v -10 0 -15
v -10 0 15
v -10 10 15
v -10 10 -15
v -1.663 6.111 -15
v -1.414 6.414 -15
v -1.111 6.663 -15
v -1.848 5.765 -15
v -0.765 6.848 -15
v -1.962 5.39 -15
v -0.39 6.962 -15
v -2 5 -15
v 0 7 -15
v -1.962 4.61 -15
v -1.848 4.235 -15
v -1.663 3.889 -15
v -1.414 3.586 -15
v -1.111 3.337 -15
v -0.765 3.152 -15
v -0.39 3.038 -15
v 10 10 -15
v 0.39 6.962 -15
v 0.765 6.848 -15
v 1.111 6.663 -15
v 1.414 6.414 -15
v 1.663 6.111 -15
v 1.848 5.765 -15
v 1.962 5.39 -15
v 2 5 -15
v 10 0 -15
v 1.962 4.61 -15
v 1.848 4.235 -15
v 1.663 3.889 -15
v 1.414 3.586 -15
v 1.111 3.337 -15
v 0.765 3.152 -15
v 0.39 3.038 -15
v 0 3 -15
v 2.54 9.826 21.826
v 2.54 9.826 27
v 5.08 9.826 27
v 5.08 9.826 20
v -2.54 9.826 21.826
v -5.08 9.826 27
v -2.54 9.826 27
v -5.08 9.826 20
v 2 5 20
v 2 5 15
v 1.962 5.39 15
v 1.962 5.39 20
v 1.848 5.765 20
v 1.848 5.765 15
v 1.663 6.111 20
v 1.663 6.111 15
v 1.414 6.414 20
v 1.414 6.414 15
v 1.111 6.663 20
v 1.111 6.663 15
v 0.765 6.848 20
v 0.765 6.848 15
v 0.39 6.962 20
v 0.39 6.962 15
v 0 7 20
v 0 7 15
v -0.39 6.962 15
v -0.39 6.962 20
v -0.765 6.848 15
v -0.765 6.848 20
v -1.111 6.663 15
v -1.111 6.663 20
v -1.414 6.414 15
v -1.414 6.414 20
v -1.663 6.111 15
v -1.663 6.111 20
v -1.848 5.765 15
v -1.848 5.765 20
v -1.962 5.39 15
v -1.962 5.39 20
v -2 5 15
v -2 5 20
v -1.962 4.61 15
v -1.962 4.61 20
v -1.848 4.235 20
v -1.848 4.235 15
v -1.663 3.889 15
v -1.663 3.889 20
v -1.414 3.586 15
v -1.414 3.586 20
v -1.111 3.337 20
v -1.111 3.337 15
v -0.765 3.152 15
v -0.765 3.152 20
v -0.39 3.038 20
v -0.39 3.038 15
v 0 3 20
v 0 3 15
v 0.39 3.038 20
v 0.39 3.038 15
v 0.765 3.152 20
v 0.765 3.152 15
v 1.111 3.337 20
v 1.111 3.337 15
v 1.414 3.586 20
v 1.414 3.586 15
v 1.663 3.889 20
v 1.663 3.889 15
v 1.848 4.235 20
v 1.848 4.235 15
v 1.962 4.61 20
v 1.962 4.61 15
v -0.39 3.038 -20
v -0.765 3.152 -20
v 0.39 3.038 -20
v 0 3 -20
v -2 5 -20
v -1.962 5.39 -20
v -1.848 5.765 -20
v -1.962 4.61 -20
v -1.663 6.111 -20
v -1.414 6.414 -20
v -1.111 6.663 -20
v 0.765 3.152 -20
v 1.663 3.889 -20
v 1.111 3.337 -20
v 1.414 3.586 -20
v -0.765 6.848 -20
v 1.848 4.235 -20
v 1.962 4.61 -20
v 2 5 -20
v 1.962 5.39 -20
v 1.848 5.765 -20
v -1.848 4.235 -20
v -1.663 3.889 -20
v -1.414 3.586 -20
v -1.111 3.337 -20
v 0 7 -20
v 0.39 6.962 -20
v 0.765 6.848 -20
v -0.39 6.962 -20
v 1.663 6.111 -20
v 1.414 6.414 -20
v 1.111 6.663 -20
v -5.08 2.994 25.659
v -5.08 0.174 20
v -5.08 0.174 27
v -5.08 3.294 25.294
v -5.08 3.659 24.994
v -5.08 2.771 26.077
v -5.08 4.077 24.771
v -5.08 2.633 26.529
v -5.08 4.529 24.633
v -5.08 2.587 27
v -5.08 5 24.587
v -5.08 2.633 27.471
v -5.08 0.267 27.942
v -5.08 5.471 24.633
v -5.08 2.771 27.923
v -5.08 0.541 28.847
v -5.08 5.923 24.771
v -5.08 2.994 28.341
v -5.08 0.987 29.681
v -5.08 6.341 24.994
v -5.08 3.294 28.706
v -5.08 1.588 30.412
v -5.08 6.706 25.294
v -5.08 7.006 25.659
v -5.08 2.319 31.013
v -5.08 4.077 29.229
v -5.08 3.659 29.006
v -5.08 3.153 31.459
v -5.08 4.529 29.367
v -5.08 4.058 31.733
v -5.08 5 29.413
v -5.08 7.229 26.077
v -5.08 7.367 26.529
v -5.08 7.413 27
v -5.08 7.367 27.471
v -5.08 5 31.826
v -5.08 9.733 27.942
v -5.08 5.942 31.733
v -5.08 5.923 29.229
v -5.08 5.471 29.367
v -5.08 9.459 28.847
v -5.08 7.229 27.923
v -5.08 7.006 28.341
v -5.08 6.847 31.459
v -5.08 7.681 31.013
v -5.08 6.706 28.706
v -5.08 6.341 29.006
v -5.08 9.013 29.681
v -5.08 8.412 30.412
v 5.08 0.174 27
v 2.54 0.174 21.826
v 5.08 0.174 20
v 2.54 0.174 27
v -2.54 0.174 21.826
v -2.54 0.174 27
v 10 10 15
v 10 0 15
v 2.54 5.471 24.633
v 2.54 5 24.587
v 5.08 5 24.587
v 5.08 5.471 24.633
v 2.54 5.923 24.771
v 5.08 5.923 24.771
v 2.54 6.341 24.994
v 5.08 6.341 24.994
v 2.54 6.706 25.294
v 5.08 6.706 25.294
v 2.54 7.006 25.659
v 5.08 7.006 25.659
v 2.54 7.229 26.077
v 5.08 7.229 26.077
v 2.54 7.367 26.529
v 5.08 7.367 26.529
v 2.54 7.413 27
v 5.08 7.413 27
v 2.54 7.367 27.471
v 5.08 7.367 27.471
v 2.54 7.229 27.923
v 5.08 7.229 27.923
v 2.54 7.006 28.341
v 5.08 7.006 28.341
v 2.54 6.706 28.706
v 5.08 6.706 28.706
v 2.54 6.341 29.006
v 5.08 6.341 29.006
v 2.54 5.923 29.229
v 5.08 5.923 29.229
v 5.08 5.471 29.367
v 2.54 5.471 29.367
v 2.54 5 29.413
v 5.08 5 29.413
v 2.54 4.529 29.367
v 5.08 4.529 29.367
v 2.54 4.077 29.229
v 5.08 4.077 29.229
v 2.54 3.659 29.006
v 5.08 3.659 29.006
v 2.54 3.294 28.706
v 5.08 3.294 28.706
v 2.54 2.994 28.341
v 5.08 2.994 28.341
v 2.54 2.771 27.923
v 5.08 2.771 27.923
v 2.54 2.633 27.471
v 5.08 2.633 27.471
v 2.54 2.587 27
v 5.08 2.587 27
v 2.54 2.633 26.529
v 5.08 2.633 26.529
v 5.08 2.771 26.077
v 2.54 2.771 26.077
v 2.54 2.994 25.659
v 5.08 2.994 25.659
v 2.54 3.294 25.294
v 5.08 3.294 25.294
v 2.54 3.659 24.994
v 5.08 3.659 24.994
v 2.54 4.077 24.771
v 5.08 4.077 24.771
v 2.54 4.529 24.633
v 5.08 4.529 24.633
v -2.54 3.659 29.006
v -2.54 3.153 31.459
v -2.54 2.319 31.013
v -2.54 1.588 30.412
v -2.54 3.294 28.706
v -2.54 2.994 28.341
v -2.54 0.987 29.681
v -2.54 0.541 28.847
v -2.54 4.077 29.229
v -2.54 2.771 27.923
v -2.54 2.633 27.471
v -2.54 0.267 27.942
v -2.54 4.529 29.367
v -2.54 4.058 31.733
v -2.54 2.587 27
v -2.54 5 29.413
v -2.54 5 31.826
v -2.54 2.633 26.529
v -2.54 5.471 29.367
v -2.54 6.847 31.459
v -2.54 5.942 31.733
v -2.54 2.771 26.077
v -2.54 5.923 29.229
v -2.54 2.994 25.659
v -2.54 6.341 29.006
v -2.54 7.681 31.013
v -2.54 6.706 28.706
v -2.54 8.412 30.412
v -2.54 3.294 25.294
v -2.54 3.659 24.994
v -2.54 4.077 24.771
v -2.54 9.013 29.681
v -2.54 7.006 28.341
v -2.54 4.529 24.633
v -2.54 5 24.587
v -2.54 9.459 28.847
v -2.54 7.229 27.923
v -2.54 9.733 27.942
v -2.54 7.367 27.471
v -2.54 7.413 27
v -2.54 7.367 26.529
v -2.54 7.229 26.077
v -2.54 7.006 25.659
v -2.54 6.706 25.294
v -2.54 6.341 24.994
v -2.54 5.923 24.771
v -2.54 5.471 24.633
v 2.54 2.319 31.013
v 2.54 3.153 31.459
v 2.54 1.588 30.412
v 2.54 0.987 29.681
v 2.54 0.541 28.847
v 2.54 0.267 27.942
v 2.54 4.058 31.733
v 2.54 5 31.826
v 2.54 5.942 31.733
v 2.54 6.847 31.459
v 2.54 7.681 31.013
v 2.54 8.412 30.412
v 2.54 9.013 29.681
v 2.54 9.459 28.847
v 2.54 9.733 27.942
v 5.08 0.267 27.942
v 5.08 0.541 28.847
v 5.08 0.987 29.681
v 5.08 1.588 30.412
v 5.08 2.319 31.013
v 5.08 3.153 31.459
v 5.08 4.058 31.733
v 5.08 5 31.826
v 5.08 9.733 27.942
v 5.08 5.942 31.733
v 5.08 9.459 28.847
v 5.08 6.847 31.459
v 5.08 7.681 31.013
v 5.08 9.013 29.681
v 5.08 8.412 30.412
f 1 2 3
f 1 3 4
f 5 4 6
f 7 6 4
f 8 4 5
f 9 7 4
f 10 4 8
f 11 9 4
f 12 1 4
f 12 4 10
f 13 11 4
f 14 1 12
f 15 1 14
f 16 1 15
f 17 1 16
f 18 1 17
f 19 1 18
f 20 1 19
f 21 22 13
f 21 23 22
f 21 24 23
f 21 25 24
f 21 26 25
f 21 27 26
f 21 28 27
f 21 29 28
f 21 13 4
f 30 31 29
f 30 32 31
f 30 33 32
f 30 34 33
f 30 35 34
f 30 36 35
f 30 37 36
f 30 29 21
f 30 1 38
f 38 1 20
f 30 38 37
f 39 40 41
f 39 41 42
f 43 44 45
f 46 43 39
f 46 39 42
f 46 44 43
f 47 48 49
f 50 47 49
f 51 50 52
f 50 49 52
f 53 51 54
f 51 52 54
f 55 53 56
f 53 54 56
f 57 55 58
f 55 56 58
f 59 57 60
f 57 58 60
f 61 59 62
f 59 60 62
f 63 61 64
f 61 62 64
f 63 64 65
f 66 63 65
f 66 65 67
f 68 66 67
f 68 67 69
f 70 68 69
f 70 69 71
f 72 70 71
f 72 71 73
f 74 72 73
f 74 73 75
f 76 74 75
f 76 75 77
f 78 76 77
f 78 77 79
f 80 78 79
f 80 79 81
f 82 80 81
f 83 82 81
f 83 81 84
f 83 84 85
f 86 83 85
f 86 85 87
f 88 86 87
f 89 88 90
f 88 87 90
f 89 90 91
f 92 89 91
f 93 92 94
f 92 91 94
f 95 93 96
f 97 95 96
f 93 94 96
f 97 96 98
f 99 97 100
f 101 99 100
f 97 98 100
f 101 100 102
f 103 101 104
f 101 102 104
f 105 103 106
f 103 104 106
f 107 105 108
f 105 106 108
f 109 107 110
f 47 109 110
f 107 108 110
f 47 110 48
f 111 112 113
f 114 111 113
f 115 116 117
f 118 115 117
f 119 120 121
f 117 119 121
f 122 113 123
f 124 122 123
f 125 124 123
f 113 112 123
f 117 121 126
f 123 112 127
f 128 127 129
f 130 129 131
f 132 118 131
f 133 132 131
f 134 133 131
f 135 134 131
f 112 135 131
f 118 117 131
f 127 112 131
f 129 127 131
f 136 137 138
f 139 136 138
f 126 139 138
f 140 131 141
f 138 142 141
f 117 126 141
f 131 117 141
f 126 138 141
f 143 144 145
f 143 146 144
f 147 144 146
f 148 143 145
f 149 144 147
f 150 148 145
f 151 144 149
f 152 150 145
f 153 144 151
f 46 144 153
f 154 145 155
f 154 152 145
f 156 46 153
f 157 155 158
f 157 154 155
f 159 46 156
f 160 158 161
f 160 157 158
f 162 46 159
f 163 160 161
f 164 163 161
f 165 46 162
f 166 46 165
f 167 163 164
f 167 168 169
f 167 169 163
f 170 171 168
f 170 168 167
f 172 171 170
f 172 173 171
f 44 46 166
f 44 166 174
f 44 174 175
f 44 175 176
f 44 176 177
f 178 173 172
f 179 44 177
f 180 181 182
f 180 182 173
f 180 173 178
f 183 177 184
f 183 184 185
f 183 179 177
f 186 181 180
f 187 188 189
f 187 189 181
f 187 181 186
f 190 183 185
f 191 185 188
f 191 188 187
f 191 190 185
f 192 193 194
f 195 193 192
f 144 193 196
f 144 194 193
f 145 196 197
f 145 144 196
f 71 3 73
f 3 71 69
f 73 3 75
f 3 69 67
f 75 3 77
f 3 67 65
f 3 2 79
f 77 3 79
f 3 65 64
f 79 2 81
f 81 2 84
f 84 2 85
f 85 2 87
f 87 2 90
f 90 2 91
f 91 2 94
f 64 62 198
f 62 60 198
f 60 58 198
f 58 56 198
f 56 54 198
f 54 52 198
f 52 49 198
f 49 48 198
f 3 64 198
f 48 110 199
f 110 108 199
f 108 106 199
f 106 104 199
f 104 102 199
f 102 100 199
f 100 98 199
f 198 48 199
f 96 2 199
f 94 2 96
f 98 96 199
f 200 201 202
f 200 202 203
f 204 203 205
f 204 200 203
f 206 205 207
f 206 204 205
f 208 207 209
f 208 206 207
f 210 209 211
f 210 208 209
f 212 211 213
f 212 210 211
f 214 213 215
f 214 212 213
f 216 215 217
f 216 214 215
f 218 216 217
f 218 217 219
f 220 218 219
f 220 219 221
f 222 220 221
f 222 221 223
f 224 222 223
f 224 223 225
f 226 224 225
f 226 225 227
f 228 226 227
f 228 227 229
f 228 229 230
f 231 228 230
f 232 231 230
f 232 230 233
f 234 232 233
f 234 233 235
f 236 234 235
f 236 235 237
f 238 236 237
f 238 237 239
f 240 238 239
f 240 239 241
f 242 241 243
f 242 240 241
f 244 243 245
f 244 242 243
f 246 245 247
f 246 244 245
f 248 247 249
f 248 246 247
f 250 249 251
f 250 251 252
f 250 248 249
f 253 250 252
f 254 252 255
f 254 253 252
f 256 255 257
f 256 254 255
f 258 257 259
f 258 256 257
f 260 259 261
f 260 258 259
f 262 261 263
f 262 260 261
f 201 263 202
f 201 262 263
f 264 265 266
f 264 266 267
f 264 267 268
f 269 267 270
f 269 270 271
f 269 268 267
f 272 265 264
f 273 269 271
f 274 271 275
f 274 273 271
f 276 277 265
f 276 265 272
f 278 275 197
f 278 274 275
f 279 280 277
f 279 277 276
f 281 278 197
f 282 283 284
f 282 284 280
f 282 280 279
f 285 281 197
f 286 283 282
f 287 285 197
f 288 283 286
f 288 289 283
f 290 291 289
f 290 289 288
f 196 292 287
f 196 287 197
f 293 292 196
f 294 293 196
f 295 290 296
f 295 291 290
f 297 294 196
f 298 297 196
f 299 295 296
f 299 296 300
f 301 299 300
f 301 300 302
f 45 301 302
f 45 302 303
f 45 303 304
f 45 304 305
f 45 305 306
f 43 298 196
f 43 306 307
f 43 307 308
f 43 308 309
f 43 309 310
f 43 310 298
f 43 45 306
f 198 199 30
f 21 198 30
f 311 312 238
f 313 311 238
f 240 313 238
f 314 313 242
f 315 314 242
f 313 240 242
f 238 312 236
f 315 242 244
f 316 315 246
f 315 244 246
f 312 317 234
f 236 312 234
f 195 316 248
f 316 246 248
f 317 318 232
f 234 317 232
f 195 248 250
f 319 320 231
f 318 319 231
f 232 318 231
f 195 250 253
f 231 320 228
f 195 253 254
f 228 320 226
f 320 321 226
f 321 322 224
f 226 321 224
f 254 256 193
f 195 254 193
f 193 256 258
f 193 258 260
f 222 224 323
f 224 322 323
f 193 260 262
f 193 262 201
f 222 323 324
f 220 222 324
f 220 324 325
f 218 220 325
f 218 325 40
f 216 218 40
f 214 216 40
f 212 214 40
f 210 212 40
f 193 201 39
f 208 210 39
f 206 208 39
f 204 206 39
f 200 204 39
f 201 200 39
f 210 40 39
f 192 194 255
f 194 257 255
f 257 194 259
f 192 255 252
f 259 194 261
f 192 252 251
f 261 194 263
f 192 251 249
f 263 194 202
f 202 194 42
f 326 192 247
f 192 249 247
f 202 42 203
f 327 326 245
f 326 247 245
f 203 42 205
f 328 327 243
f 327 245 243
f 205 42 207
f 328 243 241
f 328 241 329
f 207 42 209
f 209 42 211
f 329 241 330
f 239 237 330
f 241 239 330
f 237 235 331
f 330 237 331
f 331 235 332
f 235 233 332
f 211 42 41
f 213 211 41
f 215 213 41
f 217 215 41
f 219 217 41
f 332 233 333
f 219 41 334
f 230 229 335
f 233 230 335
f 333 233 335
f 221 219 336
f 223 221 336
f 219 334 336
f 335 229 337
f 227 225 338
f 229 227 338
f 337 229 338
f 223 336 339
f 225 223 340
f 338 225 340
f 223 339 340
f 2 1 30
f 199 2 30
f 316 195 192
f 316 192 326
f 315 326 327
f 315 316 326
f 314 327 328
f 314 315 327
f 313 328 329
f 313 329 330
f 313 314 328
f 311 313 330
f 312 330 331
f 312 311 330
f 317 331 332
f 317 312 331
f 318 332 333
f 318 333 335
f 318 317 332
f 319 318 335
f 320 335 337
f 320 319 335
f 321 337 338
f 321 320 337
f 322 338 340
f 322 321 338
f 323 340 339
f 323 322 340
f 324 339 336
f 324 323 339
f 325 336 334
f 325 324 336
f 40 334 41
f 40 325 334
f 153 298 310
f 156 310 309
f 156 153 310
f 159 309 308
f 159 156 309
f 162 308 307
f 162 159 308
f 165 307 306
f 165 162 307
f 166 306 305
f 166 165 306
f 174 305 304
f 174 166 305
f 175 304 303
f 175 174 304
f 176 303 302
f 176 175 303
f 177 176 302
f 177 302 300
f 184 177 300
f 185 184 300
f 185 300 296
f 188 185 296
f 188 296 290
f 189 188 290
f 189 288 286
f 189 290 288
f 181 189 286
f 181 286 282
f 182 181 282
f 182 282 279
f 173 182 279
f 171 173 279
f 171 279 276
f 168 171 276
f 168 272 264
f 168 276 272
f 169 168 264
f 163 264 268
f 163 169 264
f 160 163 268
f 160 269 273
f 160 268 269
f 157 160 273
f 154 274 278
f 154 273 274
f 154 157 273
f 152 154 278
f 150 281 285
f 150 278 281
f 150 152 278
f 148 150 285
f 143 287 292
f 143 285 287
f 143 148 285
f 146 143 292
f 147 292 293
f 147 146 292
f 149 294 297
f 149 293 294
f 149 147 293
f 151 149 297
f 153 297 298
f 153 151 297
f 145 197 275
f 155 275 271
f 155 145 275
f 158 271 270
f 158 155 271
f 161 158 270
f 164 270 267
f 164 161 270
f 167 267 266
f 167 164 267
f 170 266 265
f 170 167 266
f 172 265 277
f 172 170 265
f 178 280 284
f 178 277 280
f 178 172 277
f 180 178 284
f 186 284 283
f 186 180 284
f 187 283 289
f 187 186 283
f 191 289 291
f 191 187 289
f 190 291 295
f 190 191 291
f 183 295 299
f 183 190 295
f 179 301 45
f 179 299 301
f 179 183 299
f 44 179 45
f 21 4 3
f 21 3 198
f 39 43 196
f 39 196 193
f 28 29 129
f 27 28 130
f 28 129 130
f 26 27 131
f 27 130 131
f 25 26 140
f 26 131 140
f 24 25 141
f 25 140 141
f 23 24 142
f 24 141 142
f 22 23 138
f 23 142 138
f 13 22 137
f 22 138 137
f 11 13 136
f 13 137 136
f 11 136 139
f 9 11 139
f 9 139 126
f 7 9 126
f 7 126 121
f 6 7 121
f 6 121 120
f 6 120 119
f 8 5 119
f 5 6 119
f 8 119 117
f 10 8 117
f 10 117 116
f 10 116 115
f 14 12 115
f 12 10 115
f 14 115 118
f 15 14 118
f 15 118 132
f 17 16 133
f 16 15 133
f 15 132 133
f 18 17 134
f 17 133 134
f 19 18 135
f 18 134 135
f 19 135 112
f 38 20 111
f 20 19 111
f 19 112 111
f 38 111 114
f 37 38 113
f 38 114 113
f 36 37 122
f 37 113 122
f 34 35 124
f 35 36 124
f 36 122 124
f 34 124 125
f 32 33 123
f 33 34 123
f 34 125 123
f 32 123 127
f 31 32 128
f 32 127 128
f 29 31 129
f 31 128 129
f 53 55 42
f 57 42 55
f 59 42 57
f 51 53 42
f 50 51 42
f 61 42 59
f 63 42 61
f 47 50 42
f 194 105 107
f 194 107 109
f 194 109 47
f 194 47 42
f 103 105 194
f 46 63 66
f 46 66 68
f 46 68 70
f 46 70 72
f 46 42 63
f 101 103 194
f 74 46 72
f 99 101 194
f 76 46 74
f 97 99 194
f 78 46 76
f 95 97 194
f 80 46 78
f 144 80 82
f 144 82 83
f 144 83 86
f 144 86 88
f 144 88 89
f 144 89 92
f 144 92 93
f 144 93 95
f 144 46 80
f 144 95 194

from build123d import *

# Parameters (mm, degrees)
SKETCH1_W                = 20
SKETCH1_H                = 30
BOSS_EXTRUDE1_DEPTH      = 10
BOSS_EXTRUDE2_DEPTH      = 20
BOSS_EXTRUDE2_DEPTH_BACK = 20
SKETCH2_R                = 2
BOSS_EXTRUDE3_DEPTH      = 5.08
BOSS_EXTRUDE3_DEPTH_BACK = 5.08
SKETCH4_R                = 2.413
SKETCH5_W                = 5.08
SKETCH5_H                = 10
CUT_EXTRUDE1_DEPTH       = 35.777069342


with BuildPart() as part:
    # Sketch1 → Boss-Extrude1 (new body)
    with BuildSketch(Plane(origin=(0, 0, 0), x_dir=(1, 0, 0), z_dir=(0, 1, 0))):
        Rectangle(SKETCH1_W, SKETCH1_H)
    extrude(amount=BOSS_EXTRUDE1_DEPTH)

    # Sketch2 → Boss-Extrude2 (add, two sides: drawn at the far end of the back side and taken through both)
    with BuildSketch(Plane.XY.offset(-BOSS_EXTRUDE2_DEPTH_BACK)):
        with Locations((0, 5)):
            Circle(SKETCH2_R)
    extrude(amount=BOSS_EXTRUDE2_DEPTH + BOSS_EXTRUDE2_DEPTH_BACK)

    # Sketch4 → Boss-Extrude3 (add, two sides: drawn at the far end of the back side and taken through both)
    with BuildSketch(Plane(origin=(0, 0, 0), x_dir=(0, 0, -1), z_dir=(1, 0, 0)).offset(-BOSS_EXTRUDE3_DEPTH_BACK)):
        with BuildLine():
            Line((-27, 9.826), (-20, 9.826))
            Line((-20, 9.826), (-20, 0.174))
            Line((-20, 0.174), (-27, 0.174))
            ThreePointArc((-27, 0.174), (-31.826, 5), (-27, 9.826))
        make_face()
        with Locations((-27, 5)):
            Circle(SKETCH4_R, mode=Mode.SUBTRACT)
    extrude(amount=BOSS_EXTRUDE3_DEPTH + BOSS_EXTRUDE3_DEPTH_BACK)

    # Sketch5 → Cut-Extrude1 (cut, through all)
    with BuildSketch(Plane(origin=(0, 9.826, 0), x_dir=(1, 0, 0), z_dir=(0, 1, 0))):
        with Locations((0, -26.826)):
            Rectangle(SKETCH5_W, SKETCH5_H)
    extrude(amount=-CUT_EXTRUDE1_DEPTH, mode=Mode.SUBTRACT)


solid = part.part
